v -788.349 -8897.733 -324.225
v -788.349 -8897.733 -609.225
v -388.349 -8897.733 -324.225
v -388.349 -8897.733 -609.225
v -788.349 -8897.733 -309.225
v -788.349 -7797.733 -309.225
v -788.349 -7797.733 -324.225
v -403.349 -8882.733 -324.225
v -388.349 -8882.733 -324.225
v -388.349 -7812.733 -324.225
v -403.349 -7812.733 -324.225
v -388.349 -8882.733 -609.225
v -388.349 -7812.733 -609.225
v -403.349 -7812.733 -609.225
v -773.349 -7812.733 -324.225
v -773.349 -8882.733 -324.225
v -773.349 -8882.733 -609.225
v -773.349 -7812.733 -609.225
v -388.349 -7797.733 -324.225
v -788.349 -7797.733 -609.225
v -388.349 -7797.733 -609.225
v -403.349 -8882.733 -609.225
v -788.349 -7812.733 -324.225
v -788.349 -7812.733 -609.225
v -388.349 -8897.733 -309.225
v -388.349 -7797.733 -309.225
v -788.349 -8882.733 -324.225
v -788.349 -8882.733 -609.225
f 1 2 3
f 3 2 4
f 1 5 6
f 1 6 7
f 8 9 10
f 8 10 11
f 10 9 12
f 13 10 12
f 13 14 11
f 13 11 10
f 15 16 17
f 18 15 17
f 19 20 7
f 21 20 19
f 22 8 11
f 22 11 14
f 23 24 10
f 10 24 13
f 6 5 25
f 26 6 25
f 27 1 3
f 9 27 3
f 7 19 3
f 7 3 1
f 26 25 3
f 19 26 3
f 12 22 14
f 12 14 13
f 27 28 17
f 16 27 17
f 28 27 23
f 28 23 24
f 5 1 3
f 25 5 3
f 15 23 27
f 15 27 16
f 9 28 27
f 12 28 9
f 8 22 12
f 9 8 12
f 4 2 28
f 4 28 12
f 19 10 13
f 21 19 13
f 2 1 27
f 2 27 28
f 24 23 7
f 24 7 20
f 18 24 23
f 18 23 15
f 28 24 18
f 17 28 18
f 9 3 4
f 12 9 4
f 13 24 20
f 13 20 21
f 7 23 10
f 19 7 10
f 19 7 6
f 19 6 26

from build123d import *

# Parameters (mm, degrees)
SKETCH1_W           = 400
SKETCH1_H           = 300
BOSS_EXTRUDE1_DEPTH = 1100
SHELL1_T            = -15
SPLIT2_START        = -7812.732568069
SPLIT2_OUTLINE_W    = 400
SPLIT2_OUTLINE_H    = 285
SPLIT2_DEPTH        = 15
SPLIT2_START_2      = -8897.732568069
SPLIT2_2_OUTLINE_W  = 15
SPLIT2_2_OUTLINE_H  = 285
SPLIT2_2_DEPTH      = 1100
SPLIT2_3_OUTLINE_W  = 385
SPLIT2_3_OUTLINE_H  = 285
SPLIT2_3_DEPTH      = 15
SPLIT2_4_OUTLINE_W  = 385
SPLIT2_4_OUTLINE_H  = 285
SPLIT2_4_DEPTH      = 15
SPLIT2_START_3      = -8882.732568069
SPLIT2_5_OUTLINE_W  = 15
SPLIT2_5_OUTLINE_H  = 285
SPLIT2_5_DEPTH      = 1070
SPLIT2_6_OUTLINE_W  = 400
SPLIT2_6_OUTLINE_H  = 285
SPLIT2_6_DEPTH      = 15


# Read off the part's stored shape, not the designer's step: Split2
with BuildPart() as part:
    # Sketch1 → Boss-Extrude1 (new body)
    with BuildSketch(Plane(origin=(0, -8897.732568069, 0), x_dir=(1, 0, 0), z_dir=(0, 1, 0))):
        with Locations((-588.349422114, 459.224669701)):
            Rectangle(SKETCH1_W, SKETCH1_H)
    extrude(amount=BOSS_EXTRUDE1_DEPTH)

    # Shell1
    shell1_openings = [part.faces().sort_by_distance(p)[0] for p in [
        (-588.349422114, -8347.732568069, -609.224669701),
    ]]
    offset(amount=SHELL1_T, openings=shell1_openings, kind=Kind.INTERSECTION)


with BuildPart() as body_2:
    # Split1: the piece on the far side of the plane
    add(part.part)
    split(bisect_by=Plane(origin=(0, 0, -324.224669701), x_dir=(-1, 0, 0), z_dir=(0, 0, -1)), keep=Keep.BOTTOM)


with BuildPart() as part_1:
    add(part.part)

    # Split1
    split(bisect_by=Plane(origin=(0, 0, -324.224669701), x_dir=(-1, 0, 0), z_dir=(0, 0, -1)), keep=Keep.TOP)

    # Split2 2 outline → Split2 2 (cut)
    with BuildSketch(Plane(origin=(0, 0, 0), x_dir=(1, 0, 0), z_dir=(0, 1, 0)).offset(SPLIT2_START_2)):
        with Locations((-780.849422114, 466.724669701)):
            Rectangle(SPLIT2_2_OUTLINE_W, SPLIT2_2_OUTLINE_H)
    extrude(amount=SPLIT2_2_DEPTH, mode=Mode.SUBTRACT)

    # Split2 3 outline → Split2 3 (cut)
    with BuildSketch(Plane(origin=(0, 0, 0), x_dir=(1, 0, 0), z_dir=(0, 1, 0)).offset(SPLIT2_START_2)):
        with Locations((-580.849422114, 466.724669701)):
            Rectangle(SPLIT2_3_OUTLINE_W, SPLIT2_3_OUTLINE_H)
    extrude(amount=SPLIT2_3_DEPTH, mode=Mode.SUBTRACT)

    # Split2 4 outline → Split2 4 (cut)
    with BuildSketch(Plane(origin=(0, 0, 0), x_dir=(1, 0, 0), z_dir=(0, 1, 0)).offset(SPLIT2_START)):
        with Locations((-580.849422114, 466.724669701)):
            Rectangle(SPLIT2_4_OUTLINE_W, SPLIT2_4_OUTLINE_H)
    extrude(amount=SPLIT2_4_DEPTH, mode=Mode.SUBTRACT)


with BuildPart() as body_3:
    # Split2 outline → Split2 (new body)
    with BuildSketch(Plane(origin=(0, 0, 0), x_dir=(1, 0, 0), z_dir=(0, 1, 0)).offset(SPLIT2_START)):
        with Locations((-588.349422114, 466.724669701)):
            Rectangle(SPLIT2_OUTLINE_W, SPLIT2_OUTLINE_H)
    extrude(amount=SPLIT2_DEPTH)


with BuildPart() as body_4:
    # Split2 5 outline → Split2 5 (new body)
    with BuildSketch(Plane(origin=(0, 0, 0), x_dir=(1, 0, 0), z_dir=(0, 1, 0)).offset(SPLIT2_START_3)):
        with Locations((-780.849422114, 466.724669701)):
            Rectangle(SPLIT2_5_OUTLINE_W, SPLIT2_5_OUTLINE_H)
    extrude(amount=SPLIT2_5_DEPTH)


with BuildPart() as body_5:
    # Split2 6 outline → Split2 6 (new body)
    with BuildSketch(Plane(origin=(0, 0, 0), x_dir=(1, 0, 0), z_dir=(0, 1, 0)).offset(SPLIT2_START_2)):
        with Locations((-588.349422114, 466.724669701)):
            Rectangle(SPLIT2_6_OUTLINE_W, SPLIT2_6_OUTLINE_H)
    extrude(amount=SPLIT2_6_DEPTH)


solid = Compound([body_2.part, part_1.part, body_3.part, body_4.part, body_5.part])
